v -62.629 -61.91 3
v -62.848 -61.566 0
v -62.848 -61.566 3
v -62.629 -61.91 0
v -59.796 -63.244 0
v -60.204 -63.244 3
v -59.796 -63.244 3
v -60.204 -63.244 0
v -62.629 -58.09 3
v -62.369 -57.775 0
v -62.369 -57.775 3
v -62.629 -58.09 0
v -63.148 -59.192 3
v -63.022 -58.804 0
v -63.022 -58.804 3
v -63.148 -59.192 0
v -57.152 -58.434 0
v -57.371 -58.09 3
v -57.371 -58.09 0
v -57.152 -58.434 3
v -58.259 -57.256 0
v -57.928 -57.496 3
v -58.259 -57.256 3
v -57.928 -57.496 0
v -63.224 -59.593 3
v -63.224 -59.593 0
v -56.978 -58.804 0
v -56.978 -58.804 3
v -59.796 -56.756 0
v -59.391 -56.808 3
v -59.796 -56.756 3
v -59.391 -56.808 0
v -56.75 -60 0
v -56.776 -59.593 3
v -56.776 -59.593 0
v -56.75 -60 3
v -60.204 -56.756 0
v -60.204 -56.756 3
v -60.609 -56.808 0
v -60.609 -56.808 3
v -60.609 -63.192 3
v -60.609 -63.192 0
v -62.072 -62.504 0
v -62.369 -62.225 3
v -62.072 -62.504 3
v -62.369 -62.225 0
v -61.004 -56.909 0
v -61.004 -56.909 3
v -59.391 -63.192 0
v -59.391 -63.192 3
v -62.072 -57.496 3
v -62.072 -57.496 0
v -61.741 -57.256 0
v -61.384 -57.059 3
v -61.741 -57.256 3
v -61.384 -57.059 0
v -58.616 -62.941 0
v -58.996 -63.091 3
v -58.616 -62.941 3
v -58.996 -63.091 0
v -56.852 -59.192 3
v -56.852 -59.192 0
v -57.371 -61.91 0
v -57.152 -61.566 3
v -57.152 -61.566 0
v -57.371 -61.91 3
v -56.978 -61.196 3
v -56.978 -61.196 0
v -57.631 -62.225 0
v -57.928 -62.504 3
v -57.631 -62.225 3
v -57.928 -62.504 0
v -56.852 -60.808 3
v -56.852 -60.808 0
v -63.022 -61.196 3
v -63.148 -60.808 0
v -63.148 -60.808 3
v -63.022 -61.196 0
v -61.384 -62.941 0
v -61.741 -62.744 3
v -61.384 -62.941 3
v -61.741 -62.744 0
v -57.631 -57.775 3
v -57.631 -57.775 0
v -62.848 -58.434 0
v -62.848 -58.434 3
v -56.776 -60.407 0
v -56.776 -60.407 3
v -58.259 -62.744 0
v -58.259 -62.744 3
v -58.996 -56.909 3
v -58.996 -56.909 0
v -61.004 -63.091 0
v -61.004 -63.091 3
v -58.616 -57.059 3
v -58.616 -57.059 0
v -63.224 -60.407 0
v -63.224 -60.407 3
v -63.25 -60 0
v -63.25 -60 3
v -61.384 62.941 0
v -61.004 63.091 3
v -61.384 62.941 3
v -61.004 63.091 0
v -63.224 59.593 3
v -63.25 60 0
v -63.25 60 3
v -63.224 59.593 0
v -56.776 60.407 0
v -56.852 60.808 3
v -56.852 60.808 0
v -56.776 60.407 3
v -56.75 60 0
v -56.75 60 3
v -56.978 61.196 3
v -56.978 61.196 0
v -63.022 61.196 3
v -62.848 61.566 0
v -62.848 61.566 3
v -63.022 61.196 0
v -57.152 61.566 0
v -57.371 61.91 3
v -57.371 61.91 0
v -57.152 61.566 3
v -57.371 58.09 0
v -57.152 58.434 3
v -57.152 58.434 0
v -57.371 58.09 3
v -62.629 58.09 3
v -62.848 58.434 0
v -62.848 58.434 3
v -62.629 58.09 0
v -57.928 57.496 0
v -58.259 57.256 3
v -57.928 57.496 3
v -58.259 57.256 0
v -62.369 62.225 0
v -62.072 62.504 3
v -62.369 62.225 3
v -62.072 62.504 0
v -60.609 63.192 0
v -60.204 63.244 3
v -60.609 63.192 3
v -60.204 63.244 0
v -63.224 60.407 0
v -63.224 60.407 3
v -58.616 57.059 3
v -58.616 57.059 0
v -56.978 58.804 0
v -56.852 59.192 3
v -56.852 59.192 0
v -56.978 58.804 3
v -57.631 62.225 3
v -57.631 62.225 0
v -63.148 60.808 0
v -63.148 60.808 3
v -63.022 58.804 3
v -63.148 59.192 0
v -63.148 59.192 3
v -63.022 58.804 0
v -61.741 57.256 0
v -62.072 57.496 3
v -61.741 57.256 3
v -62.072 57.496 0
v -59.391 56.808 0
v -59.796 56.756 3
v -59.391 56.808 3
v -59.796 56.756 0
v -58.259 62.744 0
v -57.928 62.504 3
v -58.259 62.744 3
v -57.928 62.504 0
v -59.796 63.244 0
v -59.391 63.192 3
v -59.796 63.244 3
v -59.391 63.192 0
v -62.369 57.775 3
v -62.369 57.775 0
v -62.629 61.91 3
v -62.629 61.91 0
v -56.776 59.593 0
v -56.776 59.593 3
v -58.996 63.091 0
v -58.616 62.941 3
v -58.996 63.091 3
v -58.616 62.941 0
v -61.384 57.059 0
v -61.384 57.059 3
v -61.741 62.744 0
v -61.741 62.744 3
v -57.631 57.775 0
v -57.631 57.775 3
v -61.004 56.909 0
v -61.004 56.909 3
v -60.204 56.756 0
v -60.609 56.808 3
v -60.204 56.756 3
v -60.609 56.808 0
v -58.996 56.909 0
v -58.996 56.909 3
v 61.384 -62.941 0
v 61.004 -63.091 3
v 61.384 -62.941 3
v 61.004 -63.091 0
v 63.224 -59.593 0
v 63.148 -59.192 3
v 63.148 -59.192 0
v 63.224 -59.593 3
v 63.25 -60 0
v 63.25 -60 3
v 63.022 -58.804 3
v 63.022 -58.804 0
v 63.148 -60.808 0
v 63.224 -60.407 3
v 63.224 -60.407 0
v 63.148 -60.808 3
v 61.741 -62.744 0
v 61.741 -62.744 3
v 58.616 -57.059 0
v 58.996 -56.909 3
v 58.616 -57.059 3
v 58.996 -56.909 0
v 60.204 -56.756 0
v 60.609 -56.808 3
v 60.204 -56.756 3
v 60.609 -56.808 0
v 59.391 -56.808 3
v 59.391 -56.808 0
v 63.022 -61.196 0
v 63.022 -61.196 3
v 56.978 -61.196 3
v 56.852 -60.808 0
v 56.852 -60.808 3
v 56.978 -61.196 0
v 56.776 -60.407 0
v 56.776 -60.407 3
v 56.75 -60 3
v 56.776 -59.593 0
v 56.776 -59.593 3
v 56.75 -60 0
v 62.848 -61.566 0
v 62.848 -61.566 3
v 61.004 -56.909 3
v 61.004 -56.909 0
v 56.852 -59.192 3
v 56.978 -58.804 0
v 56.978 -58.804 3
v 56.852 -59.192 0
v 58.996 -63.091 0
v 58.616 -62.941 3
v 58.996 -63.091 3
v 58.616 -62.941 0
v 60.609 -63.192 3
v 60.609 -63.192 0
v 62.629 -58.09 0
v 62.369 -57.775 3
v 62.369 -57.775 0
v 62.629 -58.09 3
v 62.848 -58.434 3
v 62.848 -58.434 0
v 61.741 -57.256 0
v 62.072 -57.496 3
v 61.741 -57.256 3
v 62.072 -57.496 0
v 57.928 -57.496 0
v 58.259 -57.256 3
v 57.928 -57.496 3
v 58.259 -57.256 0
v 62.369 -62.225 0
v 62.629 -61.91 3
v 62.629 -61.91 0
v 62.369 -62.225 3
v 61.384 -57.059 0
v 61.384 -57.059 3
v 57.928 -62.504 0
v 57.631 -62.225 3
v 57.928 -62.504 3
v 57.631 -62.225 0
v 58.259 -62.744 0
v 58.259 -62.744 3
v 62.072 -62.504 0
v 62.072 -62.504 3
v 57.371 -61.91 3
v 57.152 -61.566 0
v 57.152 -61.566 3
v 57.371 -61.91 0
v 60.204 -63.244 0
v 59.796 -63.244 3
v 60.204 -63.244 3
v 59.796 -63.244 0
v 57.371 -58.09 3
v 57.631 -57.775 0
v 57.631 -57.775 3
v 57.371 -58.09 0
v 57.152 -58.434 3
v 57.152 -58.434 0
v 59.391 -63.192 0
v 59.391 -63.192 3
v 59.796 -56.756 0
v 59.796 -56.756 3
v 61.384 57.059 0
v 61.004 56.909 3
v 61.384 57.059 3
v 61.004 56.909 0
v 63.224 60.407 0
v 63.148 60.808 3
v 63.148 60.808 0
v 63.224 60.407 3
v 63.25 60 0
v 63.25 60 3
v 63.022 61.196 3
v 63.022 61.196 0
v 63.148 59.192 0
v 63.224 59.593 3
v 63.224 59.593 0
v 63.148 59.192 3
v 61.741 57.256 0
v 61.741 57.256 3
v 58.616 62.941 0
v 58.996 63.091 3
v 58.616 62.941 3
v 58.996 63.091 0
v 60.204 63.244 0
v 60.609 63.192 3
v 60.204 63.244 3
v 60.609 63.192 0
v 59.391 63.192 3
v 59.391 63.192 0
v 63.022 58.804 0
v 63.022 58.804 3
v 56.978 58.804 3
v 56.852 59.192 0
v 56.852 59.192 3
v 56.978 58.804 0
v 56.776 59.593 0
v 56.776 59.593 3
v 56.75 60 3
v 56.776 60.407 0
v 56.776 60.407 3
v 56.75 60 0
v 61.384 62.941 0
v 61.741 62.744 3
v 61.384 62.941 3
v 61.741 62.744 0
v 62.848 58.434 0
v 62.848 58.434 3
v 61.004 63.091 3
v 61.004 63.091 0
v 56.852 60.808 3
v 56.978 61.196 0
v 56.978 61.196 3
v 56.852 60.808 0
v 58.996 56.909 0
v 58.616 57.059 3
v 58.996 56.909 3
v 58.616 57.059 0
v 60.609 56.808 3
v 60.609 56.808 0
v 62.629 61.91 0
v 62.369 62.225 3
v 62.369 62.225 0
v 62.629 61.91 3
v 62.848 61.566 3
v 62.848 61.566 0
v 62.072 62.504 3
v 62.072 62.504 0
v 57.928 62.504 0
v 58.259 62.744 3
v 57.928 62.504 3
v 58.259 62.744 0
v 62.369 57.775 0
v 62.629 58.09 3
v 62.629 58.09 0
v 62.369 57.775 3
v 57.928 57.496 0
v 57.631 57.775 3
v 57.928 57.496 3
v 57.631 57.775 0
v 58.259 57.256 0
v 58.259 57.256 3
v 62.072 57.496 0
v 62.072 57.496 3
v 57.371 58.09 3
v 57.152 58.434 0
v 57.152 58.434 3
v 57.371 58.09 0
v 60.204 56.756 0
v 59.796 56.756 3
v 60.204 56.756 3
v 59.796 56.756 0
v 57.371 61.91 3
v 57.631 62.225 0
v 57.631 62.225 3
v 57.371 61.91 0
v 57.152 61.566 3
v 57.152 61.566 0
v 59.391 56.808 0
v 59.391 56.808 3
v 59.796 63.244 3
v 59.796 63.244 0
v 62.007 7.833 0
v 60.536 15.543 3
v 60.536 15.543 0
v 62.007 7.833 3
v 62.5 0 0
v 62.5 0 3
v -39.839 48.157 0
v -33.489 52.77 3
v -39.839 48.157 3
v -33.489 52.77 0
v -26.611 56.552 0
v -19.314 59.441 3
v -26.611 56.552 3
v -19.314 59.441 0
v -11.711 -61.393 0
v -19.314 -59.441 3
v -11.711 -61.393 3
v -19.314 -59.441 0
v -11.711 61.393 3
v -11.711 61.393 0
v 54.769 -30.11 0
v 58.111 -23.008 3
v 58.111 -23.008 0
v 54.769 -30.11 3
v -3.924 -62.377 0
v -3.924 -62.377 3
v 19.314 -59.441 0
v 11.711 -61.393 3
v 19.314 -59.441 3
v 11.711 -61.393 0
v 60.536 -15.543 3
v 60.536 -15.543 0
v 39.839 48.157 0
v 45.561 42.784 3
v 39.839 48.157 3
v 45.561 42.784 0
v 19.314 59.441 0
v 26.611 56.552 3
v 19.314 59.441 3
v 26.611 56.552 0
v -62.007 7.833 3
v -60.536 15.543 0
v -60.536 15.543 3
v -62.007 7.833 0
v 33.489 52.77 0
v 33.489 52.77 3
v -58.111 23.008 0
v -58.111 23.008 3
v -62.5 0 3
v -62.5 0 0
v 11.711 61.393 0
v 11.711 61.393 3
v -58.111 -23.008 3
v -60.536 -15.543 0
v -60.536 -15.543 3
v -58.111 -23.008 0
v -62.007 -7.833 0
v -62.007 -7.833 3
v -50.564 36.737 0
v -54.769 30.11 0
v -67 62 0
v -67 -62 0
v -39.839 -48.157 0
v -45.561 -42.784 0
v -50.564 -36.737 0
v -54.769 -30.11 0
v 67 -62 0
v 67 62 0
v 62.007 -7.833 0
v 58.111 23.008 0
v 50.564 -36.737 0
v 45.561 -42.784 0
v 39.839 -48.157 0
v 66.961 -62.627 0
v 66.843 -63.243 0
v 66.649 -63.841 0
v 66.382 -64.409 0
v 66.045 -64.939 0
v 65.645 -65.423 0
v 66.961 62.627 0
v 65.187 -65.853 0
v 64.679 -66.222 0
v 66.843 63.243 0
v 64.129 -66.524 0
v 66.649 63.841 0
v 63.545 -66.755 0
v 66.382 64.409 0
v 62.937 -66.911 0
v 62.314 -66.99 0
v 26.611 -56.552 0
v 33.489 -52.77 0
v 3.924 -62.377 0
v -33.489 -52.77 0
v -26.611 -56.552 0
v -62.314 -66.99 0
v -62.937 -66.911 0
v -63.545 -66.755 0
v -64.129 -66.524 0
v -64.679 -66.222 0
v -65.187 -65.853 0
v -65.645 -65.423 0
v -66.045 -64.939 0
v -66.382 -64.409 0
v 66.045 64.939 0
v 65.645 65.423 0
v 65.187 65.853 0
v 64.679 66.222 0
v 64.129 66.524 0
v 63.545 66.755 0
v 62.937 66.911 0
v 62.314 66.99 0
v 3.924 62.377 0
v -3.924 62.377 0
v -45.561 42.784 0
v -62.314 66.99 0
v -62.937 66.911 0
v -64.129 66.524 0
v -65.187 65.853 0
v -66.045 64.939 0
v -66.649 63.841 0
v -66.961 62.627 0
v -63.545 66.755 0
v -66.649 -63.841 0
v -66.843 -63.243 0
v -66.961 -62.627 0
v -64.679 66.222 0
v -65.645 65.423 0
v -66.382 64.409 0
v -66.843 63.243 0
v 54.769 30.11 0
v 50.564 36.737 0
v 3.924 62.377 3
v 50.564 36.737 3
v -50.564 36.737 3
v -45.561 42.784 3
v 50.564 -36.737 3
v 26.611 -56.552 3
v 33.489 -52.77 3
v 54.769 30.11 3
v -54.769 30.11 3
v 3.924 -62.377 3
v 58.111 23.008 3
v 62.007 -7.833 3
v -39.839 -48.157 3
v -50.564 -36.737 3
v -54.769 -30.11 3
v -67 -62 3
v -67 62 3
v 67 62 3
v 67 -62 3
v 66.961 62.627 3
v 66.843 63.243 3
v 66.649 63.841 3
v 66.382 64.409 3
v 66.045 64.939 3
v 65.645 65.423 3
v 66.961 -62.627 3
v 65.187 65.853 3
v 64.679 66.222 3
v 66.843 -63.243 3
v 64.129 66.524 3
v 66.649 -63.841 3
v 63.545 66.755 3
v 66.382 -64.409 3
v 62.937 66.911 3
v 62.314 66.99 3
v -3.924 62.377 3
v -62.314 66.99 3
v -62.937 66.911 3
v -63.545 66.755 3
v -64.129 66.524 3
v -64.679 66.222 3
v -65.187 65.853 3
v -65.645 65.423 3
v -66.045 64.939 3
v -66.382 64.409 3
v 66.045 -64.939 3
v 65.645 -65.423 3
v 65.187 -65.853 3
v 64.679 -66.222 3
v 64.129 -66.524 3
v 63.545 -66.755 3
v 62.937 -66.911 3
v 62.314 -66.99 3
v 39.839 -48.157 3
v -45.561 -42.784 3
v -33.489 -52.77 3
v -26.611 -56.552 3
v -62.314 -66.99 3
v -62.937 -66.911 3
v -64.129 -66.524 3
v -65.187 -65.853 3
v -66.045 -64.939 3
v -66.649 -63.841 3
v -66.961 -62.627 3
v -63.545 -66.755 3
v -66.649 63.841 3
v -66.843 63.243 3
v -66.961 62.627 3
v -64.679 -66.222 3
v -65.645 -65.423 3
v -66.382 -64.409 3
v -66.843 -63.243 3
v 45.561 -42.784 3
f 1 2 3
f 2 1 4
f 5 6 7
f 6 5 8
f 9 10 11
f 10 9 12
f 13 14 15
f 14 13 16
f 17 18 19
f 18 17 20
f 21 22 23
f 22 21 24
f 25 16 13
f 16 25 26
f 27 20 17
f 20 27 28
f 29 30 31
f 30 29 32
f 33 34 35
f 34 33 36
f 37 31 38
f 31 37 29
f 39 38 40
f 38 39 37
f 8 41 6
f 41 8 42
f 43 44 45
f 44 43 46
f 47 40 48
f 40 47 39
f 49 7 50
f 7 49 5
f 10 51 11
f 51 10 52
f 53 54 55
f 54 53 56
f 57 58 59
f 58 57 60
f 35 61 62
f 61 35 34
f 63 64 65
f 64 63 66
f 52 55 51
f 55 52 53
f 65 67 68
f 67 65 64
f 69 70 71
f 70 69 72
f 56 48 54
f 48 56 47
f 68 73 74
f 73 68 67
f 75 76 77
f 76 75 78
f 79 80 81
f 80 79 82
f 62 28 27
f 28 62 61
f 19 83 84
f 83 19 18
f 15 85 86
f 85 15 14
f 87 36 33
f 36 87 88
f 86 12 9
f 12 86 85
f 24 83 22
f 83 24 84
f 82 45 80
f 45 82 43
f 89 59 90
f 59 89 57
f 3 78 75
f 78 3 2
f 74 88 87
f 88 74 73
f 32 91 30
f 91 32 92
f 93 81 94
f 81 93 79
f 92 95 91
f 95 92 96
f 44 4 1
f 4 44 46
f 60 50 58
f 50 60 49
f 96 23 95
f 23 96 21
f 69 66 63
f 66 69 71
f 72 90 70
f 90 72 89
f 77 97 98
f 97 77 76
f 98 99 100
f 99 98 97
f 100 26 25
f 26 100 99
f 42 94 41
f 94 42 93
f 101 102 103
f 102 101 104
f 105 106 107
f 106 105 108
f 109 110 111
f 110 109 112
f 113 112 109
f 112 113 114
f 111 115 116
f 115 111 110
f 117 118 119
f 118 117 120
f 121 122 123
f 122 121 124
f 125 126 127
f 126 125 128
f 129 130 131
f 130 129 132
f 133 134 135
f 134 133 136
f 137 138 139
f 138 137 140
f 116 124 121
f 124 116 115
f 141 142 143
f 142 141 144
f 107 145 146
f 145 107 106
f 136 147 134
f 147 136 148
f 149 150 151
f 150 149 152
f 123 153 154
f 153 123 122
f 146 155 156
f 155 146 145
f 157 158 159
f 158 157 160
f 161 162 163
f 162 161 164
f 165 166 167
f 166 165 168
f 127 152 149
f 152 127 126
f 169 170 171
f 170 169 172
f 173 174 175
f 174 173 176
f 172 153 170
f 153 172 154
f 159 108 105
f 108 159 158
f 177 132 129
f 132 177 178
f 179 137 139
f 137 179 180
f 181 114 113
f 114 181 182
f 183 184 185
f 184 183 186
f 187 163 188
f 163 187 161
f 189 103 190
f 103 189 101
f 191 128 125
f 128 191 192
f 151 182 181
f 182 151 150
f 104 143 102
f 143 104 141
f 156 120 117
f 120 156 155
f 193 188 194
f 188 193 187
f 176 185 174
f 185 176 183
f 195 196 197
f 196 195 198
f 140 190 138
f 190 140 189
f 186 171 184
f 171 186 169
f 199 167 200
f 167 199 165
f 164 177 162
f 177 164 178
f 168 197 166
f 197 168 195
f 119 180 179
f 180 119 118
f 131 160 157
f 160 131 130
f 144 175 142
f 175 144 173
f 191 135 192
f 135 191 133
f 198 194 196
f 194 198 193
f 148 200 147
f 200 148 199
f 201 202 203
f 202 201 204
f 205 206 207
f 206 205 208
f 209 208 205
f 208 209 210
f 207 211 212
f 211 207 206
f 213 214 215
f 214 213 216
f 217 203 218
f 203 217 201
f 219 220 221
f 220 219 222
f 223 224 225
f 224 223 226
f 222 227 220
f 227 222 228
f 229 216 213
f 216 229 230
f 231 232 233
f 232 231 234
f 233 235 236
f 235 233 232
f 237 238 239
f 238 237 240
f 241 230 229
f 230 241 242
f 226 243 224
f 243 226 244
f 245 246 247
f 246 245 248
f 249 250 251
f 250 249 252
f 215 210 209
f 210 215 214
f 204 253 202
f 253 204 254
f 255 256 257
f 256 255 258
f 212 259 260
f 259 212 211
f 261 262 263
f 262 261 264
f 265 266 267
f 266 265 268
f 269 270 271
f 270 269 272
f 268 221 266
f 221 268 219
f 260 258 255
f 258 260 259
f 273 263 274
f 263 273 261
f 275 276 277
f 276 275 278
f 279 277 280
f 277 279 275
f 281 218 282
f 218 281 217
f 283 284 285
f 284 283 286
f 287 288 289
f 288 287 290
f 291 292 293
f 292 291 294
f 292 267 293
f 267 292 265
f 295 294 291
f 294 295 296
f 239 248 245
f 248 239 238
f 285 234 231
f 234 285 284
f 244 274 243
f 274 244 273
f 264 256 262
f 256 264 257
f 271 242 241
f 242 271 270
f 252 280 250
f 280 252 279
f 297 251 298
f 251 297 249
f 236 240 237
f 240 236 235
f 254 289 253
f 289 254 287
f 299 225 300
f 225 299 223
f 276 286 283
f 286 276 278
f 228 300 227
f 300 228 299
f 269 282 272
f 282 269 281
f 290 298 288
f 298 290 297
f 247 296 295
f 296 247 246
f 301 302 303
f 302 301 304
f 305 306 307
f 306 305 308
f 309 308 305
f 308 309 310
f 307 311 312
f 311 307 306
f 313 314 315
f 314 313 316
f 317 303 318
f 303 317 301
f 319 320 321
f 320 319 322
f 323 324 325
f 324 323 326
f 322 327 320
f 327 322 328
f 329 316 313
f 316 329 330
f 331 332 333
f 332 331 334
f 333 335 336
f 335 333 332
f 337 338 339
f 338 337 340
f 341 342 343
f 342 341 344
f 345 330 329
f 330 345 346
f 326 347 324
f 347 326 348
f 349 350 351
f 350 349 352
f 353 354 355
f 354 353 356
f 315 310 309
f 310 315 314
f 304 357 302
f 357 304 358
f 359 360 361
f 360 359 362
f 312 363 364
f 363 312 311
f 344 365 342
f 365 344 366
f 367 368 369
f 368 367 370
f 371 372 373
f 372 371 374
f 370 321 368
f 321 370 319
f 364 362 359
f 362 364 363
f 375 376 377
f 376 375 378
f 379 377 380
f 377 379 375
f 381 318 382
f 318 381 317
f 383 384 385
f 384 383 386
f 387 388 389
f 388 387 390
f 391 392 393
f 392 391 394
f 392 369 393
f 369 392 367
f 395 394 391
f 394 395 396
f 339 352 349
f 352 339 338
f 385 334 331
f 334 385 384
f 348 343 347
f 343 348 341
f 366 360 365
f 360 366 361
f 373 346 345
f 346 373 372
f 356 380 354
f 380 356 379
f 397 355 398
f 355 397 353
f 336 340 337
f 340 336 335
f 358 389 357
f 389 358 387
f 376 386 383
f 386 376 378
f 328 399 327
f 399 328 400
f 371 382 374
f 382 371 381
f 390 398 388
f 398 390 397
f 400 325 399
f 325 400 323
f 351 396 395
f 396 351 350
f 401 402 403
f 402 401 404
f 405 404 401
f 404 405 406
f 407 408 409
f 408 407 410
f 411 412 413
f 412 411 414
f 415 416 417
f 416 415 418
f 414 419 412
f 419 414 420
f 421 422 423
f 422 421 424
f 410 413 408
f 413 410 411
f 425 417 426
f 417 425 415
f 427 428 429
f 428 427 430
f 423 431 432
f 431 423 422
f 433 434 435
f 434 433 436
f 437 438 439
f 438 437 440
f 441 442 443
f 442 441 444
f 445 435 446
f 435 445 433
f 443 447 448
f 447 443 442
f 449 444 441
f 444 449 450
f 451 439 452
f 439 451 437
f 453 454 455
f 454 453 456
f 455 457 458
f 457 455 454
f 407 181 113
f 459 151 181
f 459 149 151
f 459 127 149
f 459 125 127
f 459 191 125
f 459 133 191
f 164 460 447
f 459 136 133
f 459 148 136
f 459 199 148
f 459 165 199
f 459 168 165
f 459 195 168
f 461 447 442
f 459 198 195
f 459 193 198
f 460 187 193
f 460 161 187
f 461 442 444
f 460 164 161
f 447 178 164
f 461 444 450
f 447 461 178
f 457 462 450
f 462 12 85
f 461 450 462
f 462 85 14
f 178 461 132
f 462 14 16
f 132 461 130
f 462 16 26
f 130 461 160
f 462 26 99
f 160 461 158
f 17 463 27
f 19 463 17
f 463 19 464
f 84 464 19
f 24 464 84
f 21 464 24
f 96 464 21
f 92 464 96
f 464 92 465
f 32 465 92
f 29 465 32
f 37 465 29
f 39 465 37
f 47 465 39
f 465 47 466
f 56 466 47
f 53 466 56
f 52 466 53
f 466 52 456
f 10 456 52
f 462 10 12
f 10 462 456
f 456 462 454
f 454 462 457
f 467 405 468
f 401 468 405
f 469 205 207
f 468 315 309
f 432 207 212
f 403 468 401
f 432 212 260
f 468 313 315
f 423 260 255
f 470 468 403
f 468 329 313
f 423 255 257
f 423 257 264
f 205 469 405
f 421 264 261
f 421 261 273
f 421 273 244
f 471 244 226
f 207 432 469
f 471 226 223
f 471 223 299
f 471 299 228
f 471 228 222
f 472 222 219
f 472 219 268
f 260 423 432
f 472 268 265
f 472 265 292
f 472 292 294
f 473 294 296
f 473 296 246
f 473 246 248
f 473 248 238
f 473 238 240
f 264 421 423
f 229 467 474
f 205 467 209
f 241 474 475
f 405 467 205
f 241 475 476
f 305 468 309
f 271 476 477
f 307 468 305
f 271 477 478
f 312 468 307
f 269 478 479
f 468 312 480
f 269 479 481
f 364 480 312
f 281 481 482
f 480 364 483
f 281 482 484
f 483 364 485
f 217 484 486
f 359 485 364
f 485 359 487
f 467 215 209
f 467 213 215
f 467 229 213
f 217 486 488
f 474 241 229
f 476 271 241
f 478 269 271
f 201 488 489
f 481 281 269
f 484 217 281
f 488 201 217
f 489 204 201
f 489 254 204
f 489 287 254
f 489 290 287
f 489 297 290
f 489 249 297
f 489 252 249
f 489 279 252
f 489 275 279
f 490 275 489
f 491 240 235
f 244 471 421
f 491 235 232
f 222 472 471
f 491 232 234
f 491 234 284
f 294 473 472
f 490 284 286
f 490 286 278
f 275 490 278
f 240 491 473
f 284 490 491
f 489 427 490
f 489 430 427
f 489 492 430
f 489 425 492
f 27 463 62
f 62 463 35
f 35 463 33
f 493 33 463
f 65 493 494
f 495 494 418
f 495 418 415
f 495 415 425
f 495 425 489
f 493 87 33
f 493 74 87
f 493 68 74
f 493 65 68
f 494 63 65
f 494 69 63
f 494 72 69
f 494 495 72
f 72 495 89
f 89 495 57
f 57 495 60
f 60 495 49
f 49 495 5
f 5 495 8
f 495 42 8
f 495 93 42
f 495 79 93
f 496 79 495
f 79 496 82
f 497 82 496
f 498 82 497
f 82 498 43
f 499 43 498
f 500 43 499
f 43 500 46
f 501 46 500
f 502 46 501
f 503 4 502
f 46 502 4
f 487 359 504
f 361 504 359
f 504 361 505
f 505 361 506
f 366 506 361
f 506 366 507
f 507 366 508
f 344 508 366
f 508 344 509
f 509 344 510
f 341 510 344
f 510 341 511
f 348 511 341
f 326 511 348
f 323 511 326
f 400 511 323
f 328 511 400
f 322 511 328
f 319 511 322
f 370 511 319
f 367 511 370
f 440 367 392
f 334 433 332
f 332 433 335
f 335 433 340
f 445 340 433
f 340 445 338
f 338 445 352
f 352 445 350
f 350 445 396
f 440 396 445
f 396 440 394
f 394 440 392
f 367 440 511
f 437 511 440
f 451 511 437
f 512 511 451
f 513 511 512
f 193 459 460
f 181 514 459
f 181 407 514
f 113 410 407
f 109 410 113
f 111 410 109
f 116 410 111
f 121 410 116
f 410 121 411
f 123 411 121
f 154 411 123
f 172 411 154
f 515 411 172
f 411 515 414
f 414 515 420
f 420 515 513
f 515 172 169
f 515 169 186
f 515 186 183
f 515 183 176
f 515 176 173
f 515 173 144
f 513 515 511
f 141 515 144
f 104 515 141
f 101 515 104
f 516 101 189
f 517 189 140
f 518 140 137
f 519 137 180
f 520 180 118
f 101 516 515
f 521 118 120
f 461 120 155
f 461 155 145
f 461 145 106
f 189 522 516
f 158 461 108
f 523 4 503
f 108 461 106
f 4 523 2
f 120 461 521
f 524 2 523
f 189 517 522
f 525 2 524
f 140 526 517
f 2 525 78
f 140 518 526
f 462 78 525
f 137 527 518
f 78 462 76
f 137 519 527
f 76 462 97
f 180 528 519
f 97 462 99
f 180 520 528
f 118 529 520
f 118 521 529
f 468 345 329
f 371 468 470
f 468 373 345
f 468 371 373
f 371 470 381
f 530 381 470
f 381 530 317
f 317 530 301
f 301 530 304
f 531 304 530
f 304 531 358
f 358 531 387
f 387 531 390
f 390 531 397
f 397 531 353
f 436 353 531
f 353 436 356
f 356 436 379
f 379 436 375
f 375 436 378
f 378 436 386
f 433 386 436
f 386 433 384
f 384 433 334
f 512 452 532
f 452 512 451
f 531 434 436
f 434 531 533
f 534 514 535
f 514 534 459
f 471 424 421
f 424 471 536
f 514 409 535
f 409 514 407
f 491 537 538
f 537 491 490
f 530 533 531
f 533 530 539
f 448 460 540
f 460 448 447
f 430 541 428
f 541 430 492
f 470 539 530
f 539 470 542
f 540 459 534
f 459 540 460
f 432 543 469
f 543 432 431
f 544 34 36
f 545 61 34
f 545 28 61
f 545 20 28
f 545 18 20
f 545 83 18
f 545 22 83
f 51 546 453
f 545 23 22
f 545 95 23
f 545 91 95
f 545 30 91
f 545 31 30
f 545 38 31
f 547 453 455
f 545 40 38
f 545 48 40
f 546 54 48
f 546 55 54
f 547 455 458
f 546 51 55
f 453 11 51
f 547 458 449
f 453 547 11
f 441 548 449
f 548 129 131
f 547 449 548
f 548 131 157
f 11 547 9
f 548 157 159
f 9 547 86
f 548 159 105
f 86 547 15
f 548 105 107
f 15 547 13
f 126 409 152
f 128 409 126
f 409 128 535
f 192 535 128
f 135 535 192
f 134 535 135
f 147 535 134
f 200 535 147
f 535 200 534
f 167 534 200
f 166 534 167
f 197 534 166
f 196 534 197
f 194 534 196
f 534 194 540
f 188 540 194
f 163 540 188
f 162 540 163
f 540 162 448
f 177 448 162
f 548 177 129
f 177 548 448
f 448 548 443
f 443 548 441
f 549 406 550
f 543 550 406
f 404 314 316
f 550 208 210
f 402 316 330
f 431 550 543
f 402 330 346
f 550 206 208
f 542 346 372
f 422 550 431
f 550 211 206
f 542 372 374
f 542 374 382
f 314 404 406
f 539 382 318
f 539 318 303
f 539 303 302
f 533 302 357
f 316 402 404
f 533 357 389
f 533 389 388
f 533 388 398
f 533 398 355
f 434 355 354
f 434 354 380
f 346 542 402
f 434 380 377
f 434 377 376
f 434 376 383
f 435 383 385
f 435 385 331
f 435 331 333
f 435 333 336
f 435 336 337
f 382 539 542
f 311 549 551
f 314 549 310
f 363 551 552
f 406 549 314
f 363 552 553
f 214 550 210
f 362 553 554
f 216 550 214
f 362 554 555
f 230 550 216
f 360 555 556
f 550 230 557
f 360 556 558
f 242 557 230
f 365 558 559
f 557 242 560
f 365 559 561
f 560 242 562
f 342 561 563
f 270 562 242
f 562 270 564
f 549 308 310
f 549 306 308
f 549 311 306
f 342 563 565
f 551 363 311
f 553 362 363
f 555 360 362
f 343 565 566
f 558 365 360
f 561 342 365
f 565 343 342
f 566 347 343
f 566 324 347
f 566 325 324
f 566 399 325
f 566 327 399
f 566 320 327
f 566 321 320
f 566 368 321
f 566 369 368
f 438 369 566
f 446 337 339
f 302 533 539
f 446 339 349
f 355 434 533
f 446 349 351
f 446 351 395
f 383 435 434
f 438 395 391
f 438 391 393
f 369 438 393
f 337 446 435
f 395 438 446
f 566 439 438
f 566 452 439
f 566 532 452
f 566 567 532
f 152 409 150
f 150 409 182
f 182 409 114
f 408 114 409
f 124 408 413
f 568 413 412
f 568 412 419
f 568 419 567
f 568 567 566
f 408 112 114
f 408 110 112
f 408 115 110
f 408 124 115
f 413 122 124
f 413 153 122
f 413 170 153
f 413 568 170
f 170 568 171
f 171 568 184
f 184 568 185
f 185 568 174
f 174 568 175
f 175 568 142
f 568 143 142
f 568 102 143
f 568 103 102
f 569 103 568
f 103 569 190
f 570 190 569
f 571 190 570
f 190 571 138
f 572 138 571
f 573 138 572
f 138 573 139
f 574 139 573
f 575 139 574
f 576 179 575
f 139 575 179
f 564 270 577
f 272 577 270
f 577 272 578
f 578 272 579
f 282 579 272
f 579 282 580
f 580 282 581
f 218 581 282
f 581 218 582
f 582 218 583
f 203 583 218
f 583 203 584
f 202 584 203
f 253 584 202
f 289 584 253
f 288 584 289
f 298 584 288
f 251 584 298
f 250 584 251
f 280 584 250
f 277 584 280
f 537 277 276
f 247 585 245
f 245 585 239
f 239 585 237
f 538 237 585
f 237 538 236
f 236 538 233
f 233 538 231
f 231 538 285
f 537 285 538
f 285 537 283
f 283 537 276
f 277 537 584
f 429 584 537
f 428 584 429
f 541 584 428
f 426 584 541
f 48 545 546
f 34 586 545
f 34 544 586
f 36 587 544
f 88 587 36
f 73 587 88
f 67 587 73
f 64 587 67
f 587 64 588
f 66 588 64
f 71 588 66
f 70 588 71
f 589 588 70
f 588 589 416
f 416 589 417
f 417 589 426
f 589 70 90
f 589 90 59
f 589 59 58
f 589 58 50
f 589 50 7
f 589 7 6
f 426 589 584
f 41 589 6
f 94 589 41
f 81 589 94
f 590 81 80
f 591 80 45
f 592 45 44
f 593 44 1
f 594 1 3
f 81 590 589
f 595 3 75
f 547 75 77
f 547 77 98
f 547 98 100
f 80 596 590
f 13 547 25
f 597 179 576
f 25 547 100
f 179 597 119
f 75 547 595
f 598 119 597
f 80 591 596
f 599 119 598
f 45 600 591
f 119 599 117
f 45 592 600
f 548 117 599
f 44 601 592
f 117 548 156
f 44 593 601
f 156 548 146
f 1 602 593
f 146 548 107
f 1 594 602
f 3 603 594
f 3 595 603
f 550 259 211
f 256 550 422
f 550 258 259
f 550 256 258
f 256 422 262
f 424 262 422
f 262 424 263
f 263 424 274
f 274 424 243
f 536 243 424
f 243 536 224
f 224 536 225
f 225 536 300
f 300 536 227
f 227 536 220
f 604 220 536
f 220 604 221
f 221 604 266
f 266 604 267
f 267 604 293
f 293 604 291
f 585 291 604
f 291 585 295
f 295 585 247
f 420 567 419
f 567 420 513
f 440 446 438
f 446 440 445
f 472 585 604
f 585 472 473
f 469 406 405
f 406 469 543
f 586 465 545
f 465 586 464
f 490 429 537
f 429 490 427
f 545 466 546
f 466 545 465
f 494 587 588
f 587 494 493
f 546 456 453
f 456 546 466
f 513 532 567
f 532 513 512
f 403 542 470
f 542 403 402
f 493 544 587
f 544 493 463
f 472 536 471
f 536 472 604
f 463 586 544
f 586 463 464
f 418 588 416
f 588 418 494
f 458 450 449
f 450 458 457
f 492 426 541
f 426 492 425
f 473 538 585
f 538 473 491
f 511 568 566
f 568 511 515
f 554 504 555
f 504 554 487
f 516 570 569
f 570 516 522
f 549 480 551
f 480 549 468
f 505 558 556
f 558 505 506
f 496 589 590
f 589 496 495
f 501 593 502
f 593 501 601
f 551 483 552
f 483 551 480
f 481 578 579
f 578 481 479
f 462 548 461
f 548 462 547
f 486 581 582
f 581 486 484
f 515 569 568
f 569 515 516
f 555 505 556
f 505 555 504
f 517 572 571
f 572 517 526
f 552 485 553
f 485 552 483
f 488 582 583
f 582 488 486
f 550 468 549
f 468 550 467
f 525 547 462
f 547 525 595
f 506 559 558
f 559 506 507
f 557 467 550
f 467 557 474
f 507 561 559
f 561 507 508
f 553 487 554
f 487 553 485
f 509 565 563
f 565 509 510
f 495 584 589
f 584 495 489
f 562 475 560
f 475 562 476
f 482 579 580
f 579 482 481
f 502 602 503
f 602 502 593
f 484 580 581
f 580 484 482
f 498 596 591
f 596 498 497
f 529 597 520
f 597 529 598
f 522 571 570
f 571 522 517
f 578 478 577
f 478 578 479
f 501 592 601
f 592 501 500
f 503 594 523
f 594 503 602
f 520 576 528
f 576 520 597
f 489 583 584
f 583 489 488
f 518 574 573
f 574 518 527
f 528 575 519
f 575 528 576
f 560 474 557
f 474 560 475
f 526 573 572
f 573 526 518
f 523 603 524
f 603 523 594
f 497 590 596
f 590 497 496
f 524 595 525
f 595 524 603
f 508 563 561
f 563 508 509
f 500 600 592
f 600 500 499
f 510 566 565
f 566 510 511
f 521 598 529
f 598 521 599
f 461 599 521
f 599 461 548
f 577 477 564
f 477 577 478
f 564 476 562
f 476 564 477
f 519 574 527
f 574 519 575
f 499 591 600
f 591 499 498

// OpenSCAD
$fn = 50;


difference() {
	union() {
		hull() {
			translate(v = [-62.0000000000, 62.0000000000, 0]) {
				cylinder(h = 3, r = 5);
			}
			translate(v = [62.0000000000, 62.0000000000, 0]) {
				cylinder(h = 3, r = 5);
			}
			translate(v = [-62.0000000000, -62.0000000000, 0]) {
				cylinder(h = 3, r = 5);
			}
			translate(v = [62.0000000000, -62.0000000000, 0]) {
				cylinder(h = 3, r = 5);
			}
		}
	}
	union() {
		#translate(v = [-60.0000000000, -60.0000000000, -100.0000000000]) {
			cylinder(h = 200, r = 3.2500000000);
		}
		#translate(v = [-60.0000000000, 60.0000000000, -100.0000000000]) {
			cylinder(h = 200, r = 3.2500000000);
		}
		#translate(v = [60.0000000000, -60.0000000000, -100.0000000000]) {
			cylinder(h = 200, r = 3.2500000000);
		}
		#translate(v = [60.0000000000, 60.0000000000, -100.0000000000]) {
			cylinder(h = 200, r = 3.2500000000);
		}
		#cylinder(h = 3, r = 62.5000000000);
	}
}
